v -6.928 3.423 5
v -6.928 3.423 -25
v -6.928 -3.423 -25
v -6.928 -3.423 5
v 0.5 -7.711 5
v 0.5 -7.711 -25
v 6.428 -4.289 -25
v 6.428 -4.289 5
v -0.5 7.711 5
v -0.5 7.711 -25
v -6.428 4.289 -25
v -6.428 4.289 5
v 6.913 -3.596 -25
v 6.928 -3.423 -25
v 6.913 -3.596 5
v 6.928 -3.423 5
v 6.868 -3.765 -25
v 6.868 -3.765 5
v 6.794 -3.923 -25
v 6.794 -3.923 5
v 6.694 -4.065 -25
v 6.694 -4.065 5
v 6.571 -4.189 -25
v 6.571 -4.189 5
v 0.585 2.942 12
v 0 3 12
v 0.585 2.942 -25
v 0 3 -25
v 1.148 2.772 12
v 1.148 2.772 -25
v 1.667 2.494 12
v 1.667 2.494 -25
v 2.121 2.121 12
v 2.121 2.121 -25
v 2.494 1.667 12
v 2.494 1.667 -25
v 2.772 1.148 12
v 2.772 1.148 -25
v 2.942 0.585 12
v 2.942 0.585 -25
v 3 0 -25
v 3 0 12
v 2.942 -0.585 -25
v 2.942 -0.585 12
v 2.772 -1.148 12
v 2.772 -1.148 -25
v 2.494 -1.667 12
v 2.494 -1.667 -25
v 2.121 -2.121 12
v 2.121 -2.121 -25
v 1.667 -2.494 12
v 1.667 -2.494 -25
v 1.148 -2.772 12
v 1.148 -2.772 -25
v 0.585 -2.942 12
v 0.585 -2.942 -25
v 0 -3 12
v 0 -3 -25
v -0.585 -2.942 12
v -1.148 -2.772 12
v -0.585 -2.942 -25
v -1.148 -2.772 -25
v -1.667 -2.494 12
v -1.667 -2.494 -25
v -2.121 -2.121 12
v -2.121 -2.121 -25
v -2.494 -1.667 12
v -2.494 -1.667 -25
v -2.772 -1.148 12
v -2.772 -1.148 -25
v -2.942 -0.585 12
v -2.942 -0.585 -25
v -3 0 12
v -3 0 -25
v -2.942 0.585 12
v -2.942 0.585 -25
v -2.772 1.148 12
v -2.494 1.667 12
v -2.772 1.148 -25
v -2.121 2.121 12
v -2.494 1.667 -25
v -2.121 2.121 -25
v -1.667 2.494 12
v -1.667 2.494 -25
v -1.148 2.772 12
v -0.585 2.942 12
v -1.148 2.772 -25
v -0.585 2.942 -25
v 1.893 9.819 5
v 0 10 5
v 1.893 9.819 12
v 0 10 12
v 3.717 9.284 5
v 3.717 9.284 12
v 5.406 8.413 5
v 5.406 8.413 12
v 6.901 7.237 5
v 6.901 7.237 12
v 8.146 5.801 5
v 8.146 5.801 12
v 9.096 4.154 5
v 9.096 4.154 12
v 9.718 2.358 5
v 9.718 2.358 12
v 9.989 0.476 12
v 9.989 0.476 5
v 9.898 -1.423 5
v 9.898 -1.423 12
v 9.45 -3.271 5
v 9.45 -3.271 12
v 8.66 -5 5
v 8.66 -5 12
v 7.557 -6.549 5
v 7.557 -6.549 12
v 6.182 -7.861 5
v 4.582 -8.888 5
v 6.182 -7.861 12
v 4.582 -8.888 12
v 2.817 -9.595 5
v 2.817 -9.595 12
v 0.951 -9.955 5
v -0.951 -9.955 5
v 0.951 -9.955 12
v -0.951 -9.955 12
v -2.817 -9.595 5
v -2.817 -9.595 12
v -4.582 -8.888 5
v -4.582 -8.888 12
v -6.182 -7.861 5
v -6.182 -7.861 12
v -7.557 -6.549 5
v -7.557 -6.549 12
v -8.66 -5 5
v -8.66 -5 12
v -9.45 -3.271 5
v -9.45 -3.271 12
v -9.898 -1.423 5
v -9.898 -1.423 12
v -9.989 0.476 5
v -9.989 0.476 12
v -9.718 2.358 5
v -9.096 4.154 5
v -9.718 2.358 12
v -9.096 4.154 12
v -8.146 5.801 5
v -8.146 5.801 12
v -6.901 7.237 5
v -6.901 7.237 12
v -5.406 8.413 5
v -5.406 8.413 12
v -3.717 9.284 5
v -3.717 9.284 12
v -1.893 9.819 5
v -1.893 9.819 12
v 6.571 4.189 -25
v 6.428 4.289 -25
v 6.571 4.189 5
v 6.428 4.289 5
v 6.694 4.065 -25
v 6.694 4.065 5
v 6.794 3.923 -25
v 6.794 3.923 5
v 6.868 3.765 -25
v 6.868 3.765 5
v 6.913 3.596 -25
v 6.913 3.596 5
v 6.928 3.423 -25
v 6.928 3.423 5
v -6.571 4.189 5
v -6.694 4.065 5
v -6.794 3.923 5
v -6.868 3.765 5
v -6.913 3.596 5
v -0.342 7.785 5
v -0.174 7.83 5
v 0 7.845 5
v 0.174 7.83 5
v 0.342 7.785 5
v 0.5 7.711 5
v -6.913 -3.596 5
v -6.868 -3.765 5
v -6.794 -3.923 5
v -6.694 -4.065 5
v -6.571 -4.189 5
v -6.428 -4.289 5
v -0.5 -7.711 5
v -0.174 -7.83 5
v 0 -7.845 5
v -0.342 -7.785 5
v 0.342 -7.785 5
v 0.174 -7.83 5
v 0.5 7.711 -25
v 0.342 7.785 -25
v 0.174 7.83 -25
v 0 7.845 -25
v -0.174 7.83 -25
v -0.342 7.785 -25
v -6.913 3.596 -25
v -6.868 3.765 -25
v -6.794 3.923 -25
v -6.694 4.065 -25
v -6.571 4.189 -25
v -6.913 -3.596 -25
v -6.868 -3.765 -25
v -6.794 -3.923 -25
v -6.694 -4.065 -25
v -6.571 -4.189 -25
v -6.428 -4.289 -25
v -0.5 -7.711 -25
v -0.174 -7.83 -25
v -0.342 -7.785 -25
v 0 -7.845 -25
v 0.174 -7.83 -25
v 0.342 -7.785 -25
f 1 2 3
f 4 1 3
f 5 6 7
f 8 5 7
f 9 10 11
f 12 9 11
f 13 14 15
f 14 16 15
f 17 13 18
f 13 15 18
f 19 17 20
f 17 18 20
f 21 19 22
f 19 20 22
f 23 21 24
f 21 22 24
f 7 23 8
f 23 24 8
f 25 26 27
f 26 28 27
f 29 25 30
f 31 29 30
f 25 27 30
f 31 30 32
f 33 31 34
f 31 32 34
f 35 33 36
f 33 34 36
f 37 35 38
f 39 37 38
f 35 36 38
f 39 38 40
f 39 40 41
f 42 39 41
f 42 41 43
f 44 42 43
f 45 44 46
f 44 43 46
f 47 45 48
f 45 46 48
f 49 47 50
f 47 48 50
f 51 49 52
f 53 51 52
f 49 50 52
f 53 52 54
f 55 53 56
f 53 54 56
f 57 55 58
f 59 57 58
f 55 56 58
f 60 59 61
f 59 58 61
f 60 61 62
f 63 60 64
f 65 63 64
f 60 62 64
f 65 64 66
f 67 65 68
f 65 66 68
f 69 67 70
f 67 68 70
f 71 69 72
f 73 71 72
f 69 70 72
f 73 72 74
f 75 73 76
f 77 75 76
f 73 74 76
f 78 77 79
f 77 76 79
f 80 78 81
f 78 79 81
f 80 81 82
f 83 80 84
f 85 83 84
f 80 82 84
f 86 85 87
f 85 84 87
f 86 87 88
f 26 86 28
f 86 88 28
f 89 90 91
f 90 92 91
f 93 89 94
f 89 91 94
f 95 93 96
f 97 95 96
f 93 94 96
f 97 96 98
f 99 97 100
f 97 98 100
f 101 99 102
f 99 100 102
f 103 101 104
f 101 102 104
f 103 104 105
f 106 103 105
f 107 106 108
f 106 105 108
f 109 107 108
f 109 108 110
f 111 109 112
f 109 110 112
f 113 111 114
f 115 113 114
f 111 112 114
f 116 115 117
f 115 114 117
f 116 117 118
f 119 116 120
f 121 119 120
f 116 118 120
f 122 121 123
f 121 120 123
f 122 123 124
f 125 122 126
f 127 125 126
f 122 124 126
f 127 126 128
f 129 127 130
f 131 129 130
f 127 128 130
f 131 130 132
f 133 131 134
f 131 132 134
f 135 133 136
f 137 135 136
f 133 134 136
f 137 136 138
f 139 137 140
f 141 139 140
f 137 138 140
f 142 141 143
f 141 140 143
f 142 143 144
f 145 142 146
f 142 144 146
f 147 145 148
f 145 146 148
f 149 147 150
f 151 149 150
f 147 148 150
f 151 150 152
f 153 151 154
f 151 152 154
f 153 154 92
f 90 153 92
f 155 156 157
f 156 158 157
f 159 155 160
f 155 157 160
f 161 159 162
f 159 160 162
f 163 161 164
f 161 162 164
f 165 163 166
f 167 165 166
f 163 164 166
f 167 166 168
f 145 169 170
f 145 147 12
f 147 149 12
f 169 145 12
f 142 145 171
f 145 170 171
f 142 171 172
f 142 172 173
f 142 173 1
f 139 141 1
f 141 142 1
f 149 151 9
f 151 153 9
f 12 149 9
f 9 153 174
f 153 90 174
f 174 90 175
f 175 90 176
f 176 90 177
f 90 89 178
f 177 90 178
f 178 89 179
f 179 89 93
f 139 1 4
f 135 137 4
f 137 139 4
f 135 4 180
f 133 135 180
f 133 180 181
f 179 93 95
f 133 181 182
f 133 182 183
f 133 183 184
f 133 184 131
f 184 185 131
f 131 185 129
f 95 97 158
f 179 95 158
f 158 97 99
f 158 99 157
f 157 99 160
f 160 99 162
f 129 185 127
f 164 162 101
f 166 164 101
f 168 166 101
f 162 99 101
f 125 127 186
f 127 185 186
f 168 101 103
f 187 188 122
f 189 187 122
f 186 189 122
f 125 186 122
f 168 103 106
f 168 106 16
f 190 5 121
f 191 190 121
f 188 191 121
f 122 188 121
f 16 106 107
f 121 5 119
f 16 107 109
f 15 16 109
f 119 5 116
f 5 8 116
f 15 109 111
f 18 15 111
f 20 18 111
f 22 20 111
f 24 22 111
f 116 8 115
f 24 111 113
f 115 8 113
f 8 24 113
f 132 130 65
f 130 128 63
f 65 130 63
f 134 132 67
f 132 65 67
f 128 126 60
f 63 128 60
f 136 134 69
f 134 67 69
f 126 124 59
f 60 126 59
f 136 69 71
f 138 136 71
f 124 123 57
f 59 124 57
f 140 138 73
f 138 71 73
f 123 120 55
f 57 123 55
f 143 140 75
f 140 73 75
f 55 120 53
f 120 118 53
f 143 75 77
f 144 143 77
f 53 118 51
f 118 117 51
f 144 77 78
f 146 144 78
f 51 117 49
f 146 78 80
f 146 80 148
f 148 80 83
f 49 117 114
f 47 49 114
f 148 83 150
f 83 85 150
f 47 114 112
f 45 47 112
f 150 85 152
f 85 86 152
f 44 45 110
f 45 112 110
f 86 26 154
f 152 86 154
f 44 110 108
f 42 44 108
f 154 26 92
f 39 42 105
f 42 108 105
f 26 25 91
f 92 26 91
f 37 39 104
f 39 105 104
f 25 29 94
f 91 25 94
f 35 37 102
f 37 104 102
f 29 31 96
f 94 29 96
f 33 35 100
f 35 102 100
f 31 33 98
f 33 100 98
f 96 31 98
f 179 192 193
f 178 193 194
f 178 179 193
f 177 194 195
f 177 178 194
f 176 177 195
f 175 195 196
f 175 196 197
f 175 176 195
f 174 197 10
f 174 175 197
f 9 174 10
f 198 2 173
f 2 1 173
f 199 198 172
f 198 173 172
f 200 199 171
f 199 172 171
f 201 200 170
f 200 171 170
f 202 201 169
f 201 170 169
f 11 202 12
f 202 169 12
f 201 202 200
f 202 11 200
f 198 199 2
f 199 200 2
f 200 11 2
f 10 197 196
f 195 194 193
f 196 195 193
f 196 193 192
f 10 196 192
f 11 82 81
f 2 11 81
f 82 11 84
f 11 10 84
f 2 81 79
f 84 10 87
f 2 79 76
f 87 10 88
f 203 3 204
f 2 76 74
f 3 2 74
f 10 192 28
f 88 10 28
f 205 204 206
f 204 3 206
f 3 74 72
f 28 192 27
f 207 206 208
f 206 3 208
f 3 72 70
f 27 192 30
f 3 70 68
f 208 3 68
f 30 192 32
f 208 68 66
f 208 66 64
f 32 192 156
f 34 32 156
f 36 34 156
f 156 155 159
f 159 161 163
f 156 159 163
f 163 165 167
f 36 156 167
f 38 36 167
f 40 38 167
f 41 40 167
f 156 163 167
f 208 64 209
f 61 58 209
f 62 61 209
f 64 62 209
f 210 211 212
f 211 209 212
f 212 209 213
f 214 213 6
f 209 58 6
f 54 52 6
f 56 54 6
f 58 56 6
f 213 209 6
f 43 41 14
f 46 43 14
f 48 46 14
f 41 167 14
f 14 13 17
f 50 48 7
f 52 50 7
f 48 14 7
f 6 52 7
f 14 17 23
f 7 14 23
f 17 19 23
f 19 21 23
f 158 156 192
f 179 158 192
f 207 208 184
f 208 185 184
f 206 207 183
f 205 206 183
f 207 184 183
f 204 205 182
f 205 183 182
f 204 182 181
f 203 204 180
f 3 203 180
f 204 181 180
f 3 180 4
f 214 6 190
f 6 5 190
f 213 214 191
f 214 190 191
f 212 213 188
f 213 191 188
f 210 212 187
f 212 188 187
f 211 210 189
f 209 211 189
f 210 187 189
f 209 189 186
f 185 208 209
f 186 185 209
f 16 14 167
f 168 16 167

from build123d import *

# Parameters (mm, degrees)
CUT_EXTRUDE1_DEPTH = 30
FILLET1_R          = 1


with BuildPart() as part:
    # Sketch2 → Revolve1 (revolve)
    with BuildSketch(Plane(origin=(0, 0, 0), x_dir=(0, 0, -1), z_dir=(1, 0, 0))):
        Polygon((-12, 3), (25, 3), (25, 8), (-5, 8), (-5, 10), (-12, 10), align=None)
    revolve(axis=Axis((0, 0, 0), (0, 0, -1)))

    # Sketch3 → Cut-Extrude1 (cut)
    with BuildSketch(Plane(origin=(0, 0, -25), x_dir=(-1, 0, 0), z_dir=(0, 0, -1))):
        with BuildLine():
            ThreePointArc((0, 8), (-4, 6.92820323), (-6.92820323, 4))
            Line((-6.92820323, 4), (0, 8))
        make_face()
        with BuildLine():
            ThreePointArc((-6.92820323, 4), (-8, 0), (-6.92820323, -4))
            Line((-6.92820323, -4), (-6.92820323, 4))
        make_face()
        with BuildLine():
            ThreePointArc((-6.92820323, -4), (-4, -6.92820323), (0, -8))
            Line((0, -8), (-6.92820323, -4))
        make_face()
        with BuildLine():
            Line((6.92820323, -4), (0, -8))
            ThreePointArc((0, -8), (4, -6.92820323), (6.92820323, -4))
        make_face()
        with BuildLine():
            Line((6.92820323, 4), (6.92820323, -4))
            ThreePointArc((6.92820323, -4), (7.72740661, -2.070552361), (8, 0))
            ThreePointArc((8, 0), (7.72740661, 2.070552361), (6.92820323, 4))
        make_face()
        with BuildLine():
            Line((0, 8), (6.92820323, 4))
            ThreePointArc((6.92820323, 4), (4, 6.92820323), (0, 8))
        make_face()
    extrude(amount=-CUT_EXTRUDE1_DEPTH, mode=Mode.SUBTRACT)

    # Fillet1
    fillet1_edges = [part.edges().sort_by_distance(p)[0] for p in [
        (0, 8, -10),
        (6.92820323, 4, -10),
        (6.92820323, -4, -10),
        (0, -8, -10),
        (-6.92820323, -4, -10),
        (-6.92820323, 4, -10),
    ]]
    fillet(fillet1_edges, radius=FILLET1_R)


solid = part.part
